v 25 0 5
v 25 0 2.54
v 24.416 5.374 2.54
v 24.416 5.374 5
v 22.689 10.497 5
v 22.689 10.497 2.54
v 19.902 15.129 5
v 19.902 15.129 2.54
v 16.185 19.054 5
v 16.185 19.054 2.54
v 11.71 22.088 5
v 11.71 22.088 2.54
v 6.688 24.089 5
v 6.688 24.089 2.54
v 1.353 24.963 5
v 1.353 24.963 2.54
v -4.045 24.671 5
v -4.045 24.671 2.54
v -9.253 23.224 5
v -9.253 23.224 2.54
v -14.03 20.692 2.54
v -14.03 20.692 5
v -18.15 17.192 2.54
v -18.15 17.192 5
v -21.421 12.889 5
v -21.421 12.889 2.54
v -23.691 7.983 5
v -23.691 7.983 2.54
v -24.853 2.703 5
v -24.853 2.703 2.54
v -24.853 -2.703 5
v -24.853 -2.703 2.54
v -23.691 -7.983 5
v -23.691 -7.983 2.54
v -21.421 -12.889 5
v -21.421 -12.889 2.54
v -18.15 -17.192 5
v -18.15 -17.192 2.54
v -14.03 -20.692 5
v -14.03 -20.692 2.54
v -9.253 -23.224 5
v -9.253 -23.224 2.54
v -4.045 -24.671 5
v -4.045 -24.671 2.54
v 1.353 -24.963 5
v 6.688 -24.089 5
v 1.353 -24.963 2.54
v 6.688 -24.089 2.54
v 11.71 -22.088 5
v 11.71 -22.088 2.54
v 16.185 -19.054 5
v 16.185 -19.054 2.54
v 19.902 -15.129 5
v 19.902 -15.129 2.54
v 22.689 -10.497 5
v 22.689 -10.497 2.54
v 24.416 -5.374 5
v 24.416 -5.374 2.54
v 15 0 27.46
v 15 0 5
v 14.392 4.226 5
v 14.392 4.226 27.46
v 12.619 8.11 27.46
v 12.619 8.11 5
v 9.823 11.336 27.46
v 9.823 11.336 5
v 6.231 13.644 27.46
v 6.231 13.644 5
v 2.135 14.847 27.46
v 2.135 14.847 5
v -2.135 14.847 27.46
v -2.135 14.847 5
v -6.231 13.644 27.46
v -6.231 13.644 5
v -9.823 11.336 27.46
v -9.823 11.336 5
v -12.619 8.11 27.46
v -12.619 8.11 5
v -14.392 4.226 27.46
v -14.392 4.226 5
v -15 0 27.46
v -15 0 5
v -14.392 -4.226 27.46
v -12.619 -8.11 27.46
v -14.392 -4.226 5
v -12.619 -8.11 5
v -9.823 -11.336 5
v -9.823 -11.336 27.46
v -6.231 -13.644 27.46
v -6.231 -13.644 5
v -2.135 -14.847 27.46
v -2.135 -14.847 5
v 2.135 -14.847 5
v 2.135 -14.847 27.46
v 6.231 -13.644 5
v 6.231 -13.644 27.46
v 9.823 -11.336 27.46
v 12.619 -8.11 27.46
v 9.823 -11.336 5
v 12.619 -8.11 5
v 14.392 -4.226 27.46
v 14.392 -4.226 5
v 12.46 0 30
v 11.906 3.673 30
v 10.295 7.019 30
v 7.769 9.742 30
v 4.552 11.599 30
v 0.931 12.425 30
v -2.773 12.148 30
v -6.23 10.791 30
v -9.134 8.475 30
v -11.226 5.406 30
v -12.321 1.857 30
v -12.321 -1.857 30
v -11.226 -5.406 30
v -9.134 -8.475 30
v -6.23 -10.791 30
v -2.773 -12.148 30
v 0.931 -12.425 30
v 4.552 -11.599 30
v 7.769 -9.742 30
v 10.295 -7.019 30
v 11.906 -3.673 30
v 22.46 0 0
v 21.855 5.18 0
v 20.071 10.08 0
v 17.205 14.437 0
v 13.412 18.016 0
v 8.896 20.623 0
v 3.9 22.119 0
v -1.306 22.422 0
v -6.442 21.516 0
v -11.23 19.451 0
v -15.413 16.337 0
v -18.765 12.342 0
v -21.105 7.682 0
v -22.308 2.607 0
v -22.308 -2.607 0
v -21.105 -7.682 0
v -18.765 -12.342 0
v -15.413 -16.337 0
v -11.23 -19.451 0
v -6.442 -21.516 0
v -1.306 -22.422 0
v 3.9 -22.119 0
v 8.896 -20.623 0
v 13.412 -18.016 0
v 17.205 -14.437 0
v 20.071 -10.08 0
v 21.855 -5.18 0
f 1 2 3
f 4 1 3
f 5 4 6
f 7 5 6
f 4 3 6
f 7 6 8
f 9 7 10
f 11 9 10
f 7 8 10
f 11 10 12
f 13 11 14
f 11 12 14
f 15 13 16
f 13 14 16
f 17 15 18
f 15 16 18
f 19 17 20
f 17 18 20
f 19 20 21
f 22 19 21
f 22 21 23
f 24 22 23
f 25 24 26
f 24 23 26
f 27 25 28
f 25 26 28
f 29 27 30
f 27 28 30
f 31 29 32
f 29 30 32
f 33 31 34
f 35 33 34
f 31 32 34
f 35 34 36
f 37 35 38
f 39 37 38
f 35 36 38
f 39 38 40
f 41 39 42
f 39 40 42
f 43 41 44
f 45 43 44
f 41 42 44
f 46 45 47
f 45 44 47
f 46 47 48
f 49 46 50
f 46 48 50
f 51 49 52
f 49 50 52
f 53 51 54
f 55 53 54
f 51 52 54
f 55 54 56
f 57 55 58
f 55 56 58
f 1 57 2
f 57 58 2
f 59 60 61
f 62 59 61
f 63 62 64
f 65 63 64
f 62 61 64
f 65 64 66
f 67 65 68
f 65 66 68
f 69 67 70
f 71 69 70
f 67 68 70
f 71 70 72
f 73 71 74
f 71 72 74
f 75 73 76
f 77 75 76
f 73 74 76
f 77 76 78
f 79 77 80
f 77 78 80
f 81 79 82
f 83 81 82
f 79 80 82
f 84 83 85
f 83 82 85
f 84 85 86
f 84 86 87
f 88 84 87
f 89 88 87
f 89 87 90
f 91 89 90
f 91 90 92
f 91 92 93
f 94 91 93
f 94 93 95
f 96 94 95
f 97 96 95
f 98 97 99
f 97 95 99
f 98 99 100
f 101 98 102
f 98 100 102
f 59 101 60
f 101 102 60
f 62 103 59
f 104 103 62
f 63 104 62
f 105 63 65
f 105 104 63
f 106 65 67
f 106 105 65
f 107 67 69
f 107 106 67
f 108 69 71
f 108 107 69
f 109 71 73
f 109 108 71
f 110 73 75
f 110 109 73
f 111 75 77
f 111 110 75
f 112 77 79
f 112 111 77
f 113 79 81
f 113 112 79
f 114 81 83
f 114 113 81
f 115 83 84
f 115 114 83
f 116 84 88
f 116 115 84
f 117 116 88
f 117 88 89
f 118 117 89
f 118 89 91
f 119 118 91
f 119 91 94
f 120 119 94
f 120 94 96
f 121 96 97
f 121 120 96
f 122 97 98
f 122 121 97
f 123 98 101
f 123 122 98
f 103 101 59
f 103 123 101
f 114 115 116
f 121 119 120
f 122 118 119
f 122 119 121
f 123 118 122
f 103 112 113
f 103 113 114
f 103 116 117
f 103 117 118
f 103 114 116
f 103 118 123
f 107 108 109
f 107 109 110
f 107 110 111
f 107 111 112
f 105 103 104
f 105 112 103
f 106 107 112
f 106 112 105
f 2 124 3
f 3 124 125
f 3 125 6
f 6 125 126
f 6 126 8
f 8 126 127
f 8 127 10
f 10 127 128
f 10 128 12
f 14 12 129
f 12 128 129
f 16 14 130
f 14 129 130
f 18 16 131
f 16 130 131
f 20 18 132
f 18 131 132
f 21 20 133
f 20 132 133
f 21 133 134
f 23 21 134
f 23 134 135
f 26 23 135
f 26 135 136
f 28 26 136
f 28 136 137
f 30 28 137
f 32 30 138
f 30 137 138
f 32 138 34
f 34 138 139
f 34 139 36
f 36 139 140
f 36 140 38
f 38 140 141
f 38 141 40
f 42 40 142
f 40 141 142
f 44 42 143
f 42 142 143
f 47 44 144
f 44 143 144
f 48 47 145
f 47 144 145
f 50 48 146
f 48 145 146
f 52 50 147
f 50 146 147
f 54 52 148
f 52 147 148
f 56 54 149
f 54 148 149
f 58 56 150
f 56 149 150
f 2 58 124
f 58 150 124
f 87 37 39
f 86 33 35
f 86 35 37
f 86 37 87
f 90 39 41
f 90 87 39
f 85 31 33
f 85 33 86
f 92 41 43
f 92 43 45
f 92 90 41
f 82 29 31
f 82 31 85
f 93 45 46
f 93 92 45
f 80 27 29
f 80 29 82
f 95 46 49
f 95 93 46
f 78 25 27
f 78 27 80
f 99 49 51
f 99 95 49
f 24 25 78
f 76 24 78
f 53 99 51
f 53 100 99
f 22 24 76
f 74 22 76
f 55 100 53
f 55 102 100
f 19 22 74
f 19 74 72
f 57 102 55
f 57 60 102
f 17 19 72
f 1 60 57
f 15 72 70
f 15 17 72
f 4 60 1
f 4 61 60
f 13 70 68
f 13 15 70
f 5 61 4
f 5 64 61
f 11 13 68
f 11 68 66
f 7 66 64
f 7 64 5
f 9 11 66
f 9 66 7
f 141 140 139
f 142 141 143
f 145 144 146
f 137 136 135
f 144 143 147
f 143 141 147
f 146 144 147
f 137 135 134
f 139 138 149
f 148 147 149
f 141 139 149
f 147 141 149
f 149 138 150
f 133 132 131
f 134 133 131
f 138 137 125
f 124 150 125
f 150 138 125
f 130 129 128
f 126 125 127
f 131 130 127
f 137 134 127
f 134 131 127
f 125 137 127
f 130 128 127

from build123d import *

# Parameters (mm, degrees)
F0_R      = 15
F1_DEPTH  = 25
F0_R_2    = 25
F1_FACE_R = 15
F2_DEPTH  = 5
F3_SIZE   = 2.54
F4_SIZE   = 2.54


with BuildPart() as f1:
    # F0 (on Top) → F1 (new body)
    with BuildSketch(Plane.XY):
        Circle(F0_R)
    extrude(amount=F1_DEPTH)

    # F0 (on Top) + F1_face (on face) → F2 (join)
    with BuildSketch(Plane.XY):
        Circle(F0_R_2)
        Circle(F0_R, mode=Mode.SUBTRACT)
    with BuildSketch(Plane.XY.offset(25)):
        Circle(F1_FACE_R)
    extrude(amount=F2_DEPTH)

    # F3
    f3_edges = [f1.edges().sort_by_distance(p)[0] for p in [
        (-25, 0, 0),
    ]]
    chamfer(f3_edges, length=F3_SIZE)

    # F4
    f4_edges = [f1.edges().sort_by_distance(p)[0] for p in [
        (-15, 0, 30),
    ]]
    chamfer(f4_edges, length=F4_SIZE)


solid = f1.part
